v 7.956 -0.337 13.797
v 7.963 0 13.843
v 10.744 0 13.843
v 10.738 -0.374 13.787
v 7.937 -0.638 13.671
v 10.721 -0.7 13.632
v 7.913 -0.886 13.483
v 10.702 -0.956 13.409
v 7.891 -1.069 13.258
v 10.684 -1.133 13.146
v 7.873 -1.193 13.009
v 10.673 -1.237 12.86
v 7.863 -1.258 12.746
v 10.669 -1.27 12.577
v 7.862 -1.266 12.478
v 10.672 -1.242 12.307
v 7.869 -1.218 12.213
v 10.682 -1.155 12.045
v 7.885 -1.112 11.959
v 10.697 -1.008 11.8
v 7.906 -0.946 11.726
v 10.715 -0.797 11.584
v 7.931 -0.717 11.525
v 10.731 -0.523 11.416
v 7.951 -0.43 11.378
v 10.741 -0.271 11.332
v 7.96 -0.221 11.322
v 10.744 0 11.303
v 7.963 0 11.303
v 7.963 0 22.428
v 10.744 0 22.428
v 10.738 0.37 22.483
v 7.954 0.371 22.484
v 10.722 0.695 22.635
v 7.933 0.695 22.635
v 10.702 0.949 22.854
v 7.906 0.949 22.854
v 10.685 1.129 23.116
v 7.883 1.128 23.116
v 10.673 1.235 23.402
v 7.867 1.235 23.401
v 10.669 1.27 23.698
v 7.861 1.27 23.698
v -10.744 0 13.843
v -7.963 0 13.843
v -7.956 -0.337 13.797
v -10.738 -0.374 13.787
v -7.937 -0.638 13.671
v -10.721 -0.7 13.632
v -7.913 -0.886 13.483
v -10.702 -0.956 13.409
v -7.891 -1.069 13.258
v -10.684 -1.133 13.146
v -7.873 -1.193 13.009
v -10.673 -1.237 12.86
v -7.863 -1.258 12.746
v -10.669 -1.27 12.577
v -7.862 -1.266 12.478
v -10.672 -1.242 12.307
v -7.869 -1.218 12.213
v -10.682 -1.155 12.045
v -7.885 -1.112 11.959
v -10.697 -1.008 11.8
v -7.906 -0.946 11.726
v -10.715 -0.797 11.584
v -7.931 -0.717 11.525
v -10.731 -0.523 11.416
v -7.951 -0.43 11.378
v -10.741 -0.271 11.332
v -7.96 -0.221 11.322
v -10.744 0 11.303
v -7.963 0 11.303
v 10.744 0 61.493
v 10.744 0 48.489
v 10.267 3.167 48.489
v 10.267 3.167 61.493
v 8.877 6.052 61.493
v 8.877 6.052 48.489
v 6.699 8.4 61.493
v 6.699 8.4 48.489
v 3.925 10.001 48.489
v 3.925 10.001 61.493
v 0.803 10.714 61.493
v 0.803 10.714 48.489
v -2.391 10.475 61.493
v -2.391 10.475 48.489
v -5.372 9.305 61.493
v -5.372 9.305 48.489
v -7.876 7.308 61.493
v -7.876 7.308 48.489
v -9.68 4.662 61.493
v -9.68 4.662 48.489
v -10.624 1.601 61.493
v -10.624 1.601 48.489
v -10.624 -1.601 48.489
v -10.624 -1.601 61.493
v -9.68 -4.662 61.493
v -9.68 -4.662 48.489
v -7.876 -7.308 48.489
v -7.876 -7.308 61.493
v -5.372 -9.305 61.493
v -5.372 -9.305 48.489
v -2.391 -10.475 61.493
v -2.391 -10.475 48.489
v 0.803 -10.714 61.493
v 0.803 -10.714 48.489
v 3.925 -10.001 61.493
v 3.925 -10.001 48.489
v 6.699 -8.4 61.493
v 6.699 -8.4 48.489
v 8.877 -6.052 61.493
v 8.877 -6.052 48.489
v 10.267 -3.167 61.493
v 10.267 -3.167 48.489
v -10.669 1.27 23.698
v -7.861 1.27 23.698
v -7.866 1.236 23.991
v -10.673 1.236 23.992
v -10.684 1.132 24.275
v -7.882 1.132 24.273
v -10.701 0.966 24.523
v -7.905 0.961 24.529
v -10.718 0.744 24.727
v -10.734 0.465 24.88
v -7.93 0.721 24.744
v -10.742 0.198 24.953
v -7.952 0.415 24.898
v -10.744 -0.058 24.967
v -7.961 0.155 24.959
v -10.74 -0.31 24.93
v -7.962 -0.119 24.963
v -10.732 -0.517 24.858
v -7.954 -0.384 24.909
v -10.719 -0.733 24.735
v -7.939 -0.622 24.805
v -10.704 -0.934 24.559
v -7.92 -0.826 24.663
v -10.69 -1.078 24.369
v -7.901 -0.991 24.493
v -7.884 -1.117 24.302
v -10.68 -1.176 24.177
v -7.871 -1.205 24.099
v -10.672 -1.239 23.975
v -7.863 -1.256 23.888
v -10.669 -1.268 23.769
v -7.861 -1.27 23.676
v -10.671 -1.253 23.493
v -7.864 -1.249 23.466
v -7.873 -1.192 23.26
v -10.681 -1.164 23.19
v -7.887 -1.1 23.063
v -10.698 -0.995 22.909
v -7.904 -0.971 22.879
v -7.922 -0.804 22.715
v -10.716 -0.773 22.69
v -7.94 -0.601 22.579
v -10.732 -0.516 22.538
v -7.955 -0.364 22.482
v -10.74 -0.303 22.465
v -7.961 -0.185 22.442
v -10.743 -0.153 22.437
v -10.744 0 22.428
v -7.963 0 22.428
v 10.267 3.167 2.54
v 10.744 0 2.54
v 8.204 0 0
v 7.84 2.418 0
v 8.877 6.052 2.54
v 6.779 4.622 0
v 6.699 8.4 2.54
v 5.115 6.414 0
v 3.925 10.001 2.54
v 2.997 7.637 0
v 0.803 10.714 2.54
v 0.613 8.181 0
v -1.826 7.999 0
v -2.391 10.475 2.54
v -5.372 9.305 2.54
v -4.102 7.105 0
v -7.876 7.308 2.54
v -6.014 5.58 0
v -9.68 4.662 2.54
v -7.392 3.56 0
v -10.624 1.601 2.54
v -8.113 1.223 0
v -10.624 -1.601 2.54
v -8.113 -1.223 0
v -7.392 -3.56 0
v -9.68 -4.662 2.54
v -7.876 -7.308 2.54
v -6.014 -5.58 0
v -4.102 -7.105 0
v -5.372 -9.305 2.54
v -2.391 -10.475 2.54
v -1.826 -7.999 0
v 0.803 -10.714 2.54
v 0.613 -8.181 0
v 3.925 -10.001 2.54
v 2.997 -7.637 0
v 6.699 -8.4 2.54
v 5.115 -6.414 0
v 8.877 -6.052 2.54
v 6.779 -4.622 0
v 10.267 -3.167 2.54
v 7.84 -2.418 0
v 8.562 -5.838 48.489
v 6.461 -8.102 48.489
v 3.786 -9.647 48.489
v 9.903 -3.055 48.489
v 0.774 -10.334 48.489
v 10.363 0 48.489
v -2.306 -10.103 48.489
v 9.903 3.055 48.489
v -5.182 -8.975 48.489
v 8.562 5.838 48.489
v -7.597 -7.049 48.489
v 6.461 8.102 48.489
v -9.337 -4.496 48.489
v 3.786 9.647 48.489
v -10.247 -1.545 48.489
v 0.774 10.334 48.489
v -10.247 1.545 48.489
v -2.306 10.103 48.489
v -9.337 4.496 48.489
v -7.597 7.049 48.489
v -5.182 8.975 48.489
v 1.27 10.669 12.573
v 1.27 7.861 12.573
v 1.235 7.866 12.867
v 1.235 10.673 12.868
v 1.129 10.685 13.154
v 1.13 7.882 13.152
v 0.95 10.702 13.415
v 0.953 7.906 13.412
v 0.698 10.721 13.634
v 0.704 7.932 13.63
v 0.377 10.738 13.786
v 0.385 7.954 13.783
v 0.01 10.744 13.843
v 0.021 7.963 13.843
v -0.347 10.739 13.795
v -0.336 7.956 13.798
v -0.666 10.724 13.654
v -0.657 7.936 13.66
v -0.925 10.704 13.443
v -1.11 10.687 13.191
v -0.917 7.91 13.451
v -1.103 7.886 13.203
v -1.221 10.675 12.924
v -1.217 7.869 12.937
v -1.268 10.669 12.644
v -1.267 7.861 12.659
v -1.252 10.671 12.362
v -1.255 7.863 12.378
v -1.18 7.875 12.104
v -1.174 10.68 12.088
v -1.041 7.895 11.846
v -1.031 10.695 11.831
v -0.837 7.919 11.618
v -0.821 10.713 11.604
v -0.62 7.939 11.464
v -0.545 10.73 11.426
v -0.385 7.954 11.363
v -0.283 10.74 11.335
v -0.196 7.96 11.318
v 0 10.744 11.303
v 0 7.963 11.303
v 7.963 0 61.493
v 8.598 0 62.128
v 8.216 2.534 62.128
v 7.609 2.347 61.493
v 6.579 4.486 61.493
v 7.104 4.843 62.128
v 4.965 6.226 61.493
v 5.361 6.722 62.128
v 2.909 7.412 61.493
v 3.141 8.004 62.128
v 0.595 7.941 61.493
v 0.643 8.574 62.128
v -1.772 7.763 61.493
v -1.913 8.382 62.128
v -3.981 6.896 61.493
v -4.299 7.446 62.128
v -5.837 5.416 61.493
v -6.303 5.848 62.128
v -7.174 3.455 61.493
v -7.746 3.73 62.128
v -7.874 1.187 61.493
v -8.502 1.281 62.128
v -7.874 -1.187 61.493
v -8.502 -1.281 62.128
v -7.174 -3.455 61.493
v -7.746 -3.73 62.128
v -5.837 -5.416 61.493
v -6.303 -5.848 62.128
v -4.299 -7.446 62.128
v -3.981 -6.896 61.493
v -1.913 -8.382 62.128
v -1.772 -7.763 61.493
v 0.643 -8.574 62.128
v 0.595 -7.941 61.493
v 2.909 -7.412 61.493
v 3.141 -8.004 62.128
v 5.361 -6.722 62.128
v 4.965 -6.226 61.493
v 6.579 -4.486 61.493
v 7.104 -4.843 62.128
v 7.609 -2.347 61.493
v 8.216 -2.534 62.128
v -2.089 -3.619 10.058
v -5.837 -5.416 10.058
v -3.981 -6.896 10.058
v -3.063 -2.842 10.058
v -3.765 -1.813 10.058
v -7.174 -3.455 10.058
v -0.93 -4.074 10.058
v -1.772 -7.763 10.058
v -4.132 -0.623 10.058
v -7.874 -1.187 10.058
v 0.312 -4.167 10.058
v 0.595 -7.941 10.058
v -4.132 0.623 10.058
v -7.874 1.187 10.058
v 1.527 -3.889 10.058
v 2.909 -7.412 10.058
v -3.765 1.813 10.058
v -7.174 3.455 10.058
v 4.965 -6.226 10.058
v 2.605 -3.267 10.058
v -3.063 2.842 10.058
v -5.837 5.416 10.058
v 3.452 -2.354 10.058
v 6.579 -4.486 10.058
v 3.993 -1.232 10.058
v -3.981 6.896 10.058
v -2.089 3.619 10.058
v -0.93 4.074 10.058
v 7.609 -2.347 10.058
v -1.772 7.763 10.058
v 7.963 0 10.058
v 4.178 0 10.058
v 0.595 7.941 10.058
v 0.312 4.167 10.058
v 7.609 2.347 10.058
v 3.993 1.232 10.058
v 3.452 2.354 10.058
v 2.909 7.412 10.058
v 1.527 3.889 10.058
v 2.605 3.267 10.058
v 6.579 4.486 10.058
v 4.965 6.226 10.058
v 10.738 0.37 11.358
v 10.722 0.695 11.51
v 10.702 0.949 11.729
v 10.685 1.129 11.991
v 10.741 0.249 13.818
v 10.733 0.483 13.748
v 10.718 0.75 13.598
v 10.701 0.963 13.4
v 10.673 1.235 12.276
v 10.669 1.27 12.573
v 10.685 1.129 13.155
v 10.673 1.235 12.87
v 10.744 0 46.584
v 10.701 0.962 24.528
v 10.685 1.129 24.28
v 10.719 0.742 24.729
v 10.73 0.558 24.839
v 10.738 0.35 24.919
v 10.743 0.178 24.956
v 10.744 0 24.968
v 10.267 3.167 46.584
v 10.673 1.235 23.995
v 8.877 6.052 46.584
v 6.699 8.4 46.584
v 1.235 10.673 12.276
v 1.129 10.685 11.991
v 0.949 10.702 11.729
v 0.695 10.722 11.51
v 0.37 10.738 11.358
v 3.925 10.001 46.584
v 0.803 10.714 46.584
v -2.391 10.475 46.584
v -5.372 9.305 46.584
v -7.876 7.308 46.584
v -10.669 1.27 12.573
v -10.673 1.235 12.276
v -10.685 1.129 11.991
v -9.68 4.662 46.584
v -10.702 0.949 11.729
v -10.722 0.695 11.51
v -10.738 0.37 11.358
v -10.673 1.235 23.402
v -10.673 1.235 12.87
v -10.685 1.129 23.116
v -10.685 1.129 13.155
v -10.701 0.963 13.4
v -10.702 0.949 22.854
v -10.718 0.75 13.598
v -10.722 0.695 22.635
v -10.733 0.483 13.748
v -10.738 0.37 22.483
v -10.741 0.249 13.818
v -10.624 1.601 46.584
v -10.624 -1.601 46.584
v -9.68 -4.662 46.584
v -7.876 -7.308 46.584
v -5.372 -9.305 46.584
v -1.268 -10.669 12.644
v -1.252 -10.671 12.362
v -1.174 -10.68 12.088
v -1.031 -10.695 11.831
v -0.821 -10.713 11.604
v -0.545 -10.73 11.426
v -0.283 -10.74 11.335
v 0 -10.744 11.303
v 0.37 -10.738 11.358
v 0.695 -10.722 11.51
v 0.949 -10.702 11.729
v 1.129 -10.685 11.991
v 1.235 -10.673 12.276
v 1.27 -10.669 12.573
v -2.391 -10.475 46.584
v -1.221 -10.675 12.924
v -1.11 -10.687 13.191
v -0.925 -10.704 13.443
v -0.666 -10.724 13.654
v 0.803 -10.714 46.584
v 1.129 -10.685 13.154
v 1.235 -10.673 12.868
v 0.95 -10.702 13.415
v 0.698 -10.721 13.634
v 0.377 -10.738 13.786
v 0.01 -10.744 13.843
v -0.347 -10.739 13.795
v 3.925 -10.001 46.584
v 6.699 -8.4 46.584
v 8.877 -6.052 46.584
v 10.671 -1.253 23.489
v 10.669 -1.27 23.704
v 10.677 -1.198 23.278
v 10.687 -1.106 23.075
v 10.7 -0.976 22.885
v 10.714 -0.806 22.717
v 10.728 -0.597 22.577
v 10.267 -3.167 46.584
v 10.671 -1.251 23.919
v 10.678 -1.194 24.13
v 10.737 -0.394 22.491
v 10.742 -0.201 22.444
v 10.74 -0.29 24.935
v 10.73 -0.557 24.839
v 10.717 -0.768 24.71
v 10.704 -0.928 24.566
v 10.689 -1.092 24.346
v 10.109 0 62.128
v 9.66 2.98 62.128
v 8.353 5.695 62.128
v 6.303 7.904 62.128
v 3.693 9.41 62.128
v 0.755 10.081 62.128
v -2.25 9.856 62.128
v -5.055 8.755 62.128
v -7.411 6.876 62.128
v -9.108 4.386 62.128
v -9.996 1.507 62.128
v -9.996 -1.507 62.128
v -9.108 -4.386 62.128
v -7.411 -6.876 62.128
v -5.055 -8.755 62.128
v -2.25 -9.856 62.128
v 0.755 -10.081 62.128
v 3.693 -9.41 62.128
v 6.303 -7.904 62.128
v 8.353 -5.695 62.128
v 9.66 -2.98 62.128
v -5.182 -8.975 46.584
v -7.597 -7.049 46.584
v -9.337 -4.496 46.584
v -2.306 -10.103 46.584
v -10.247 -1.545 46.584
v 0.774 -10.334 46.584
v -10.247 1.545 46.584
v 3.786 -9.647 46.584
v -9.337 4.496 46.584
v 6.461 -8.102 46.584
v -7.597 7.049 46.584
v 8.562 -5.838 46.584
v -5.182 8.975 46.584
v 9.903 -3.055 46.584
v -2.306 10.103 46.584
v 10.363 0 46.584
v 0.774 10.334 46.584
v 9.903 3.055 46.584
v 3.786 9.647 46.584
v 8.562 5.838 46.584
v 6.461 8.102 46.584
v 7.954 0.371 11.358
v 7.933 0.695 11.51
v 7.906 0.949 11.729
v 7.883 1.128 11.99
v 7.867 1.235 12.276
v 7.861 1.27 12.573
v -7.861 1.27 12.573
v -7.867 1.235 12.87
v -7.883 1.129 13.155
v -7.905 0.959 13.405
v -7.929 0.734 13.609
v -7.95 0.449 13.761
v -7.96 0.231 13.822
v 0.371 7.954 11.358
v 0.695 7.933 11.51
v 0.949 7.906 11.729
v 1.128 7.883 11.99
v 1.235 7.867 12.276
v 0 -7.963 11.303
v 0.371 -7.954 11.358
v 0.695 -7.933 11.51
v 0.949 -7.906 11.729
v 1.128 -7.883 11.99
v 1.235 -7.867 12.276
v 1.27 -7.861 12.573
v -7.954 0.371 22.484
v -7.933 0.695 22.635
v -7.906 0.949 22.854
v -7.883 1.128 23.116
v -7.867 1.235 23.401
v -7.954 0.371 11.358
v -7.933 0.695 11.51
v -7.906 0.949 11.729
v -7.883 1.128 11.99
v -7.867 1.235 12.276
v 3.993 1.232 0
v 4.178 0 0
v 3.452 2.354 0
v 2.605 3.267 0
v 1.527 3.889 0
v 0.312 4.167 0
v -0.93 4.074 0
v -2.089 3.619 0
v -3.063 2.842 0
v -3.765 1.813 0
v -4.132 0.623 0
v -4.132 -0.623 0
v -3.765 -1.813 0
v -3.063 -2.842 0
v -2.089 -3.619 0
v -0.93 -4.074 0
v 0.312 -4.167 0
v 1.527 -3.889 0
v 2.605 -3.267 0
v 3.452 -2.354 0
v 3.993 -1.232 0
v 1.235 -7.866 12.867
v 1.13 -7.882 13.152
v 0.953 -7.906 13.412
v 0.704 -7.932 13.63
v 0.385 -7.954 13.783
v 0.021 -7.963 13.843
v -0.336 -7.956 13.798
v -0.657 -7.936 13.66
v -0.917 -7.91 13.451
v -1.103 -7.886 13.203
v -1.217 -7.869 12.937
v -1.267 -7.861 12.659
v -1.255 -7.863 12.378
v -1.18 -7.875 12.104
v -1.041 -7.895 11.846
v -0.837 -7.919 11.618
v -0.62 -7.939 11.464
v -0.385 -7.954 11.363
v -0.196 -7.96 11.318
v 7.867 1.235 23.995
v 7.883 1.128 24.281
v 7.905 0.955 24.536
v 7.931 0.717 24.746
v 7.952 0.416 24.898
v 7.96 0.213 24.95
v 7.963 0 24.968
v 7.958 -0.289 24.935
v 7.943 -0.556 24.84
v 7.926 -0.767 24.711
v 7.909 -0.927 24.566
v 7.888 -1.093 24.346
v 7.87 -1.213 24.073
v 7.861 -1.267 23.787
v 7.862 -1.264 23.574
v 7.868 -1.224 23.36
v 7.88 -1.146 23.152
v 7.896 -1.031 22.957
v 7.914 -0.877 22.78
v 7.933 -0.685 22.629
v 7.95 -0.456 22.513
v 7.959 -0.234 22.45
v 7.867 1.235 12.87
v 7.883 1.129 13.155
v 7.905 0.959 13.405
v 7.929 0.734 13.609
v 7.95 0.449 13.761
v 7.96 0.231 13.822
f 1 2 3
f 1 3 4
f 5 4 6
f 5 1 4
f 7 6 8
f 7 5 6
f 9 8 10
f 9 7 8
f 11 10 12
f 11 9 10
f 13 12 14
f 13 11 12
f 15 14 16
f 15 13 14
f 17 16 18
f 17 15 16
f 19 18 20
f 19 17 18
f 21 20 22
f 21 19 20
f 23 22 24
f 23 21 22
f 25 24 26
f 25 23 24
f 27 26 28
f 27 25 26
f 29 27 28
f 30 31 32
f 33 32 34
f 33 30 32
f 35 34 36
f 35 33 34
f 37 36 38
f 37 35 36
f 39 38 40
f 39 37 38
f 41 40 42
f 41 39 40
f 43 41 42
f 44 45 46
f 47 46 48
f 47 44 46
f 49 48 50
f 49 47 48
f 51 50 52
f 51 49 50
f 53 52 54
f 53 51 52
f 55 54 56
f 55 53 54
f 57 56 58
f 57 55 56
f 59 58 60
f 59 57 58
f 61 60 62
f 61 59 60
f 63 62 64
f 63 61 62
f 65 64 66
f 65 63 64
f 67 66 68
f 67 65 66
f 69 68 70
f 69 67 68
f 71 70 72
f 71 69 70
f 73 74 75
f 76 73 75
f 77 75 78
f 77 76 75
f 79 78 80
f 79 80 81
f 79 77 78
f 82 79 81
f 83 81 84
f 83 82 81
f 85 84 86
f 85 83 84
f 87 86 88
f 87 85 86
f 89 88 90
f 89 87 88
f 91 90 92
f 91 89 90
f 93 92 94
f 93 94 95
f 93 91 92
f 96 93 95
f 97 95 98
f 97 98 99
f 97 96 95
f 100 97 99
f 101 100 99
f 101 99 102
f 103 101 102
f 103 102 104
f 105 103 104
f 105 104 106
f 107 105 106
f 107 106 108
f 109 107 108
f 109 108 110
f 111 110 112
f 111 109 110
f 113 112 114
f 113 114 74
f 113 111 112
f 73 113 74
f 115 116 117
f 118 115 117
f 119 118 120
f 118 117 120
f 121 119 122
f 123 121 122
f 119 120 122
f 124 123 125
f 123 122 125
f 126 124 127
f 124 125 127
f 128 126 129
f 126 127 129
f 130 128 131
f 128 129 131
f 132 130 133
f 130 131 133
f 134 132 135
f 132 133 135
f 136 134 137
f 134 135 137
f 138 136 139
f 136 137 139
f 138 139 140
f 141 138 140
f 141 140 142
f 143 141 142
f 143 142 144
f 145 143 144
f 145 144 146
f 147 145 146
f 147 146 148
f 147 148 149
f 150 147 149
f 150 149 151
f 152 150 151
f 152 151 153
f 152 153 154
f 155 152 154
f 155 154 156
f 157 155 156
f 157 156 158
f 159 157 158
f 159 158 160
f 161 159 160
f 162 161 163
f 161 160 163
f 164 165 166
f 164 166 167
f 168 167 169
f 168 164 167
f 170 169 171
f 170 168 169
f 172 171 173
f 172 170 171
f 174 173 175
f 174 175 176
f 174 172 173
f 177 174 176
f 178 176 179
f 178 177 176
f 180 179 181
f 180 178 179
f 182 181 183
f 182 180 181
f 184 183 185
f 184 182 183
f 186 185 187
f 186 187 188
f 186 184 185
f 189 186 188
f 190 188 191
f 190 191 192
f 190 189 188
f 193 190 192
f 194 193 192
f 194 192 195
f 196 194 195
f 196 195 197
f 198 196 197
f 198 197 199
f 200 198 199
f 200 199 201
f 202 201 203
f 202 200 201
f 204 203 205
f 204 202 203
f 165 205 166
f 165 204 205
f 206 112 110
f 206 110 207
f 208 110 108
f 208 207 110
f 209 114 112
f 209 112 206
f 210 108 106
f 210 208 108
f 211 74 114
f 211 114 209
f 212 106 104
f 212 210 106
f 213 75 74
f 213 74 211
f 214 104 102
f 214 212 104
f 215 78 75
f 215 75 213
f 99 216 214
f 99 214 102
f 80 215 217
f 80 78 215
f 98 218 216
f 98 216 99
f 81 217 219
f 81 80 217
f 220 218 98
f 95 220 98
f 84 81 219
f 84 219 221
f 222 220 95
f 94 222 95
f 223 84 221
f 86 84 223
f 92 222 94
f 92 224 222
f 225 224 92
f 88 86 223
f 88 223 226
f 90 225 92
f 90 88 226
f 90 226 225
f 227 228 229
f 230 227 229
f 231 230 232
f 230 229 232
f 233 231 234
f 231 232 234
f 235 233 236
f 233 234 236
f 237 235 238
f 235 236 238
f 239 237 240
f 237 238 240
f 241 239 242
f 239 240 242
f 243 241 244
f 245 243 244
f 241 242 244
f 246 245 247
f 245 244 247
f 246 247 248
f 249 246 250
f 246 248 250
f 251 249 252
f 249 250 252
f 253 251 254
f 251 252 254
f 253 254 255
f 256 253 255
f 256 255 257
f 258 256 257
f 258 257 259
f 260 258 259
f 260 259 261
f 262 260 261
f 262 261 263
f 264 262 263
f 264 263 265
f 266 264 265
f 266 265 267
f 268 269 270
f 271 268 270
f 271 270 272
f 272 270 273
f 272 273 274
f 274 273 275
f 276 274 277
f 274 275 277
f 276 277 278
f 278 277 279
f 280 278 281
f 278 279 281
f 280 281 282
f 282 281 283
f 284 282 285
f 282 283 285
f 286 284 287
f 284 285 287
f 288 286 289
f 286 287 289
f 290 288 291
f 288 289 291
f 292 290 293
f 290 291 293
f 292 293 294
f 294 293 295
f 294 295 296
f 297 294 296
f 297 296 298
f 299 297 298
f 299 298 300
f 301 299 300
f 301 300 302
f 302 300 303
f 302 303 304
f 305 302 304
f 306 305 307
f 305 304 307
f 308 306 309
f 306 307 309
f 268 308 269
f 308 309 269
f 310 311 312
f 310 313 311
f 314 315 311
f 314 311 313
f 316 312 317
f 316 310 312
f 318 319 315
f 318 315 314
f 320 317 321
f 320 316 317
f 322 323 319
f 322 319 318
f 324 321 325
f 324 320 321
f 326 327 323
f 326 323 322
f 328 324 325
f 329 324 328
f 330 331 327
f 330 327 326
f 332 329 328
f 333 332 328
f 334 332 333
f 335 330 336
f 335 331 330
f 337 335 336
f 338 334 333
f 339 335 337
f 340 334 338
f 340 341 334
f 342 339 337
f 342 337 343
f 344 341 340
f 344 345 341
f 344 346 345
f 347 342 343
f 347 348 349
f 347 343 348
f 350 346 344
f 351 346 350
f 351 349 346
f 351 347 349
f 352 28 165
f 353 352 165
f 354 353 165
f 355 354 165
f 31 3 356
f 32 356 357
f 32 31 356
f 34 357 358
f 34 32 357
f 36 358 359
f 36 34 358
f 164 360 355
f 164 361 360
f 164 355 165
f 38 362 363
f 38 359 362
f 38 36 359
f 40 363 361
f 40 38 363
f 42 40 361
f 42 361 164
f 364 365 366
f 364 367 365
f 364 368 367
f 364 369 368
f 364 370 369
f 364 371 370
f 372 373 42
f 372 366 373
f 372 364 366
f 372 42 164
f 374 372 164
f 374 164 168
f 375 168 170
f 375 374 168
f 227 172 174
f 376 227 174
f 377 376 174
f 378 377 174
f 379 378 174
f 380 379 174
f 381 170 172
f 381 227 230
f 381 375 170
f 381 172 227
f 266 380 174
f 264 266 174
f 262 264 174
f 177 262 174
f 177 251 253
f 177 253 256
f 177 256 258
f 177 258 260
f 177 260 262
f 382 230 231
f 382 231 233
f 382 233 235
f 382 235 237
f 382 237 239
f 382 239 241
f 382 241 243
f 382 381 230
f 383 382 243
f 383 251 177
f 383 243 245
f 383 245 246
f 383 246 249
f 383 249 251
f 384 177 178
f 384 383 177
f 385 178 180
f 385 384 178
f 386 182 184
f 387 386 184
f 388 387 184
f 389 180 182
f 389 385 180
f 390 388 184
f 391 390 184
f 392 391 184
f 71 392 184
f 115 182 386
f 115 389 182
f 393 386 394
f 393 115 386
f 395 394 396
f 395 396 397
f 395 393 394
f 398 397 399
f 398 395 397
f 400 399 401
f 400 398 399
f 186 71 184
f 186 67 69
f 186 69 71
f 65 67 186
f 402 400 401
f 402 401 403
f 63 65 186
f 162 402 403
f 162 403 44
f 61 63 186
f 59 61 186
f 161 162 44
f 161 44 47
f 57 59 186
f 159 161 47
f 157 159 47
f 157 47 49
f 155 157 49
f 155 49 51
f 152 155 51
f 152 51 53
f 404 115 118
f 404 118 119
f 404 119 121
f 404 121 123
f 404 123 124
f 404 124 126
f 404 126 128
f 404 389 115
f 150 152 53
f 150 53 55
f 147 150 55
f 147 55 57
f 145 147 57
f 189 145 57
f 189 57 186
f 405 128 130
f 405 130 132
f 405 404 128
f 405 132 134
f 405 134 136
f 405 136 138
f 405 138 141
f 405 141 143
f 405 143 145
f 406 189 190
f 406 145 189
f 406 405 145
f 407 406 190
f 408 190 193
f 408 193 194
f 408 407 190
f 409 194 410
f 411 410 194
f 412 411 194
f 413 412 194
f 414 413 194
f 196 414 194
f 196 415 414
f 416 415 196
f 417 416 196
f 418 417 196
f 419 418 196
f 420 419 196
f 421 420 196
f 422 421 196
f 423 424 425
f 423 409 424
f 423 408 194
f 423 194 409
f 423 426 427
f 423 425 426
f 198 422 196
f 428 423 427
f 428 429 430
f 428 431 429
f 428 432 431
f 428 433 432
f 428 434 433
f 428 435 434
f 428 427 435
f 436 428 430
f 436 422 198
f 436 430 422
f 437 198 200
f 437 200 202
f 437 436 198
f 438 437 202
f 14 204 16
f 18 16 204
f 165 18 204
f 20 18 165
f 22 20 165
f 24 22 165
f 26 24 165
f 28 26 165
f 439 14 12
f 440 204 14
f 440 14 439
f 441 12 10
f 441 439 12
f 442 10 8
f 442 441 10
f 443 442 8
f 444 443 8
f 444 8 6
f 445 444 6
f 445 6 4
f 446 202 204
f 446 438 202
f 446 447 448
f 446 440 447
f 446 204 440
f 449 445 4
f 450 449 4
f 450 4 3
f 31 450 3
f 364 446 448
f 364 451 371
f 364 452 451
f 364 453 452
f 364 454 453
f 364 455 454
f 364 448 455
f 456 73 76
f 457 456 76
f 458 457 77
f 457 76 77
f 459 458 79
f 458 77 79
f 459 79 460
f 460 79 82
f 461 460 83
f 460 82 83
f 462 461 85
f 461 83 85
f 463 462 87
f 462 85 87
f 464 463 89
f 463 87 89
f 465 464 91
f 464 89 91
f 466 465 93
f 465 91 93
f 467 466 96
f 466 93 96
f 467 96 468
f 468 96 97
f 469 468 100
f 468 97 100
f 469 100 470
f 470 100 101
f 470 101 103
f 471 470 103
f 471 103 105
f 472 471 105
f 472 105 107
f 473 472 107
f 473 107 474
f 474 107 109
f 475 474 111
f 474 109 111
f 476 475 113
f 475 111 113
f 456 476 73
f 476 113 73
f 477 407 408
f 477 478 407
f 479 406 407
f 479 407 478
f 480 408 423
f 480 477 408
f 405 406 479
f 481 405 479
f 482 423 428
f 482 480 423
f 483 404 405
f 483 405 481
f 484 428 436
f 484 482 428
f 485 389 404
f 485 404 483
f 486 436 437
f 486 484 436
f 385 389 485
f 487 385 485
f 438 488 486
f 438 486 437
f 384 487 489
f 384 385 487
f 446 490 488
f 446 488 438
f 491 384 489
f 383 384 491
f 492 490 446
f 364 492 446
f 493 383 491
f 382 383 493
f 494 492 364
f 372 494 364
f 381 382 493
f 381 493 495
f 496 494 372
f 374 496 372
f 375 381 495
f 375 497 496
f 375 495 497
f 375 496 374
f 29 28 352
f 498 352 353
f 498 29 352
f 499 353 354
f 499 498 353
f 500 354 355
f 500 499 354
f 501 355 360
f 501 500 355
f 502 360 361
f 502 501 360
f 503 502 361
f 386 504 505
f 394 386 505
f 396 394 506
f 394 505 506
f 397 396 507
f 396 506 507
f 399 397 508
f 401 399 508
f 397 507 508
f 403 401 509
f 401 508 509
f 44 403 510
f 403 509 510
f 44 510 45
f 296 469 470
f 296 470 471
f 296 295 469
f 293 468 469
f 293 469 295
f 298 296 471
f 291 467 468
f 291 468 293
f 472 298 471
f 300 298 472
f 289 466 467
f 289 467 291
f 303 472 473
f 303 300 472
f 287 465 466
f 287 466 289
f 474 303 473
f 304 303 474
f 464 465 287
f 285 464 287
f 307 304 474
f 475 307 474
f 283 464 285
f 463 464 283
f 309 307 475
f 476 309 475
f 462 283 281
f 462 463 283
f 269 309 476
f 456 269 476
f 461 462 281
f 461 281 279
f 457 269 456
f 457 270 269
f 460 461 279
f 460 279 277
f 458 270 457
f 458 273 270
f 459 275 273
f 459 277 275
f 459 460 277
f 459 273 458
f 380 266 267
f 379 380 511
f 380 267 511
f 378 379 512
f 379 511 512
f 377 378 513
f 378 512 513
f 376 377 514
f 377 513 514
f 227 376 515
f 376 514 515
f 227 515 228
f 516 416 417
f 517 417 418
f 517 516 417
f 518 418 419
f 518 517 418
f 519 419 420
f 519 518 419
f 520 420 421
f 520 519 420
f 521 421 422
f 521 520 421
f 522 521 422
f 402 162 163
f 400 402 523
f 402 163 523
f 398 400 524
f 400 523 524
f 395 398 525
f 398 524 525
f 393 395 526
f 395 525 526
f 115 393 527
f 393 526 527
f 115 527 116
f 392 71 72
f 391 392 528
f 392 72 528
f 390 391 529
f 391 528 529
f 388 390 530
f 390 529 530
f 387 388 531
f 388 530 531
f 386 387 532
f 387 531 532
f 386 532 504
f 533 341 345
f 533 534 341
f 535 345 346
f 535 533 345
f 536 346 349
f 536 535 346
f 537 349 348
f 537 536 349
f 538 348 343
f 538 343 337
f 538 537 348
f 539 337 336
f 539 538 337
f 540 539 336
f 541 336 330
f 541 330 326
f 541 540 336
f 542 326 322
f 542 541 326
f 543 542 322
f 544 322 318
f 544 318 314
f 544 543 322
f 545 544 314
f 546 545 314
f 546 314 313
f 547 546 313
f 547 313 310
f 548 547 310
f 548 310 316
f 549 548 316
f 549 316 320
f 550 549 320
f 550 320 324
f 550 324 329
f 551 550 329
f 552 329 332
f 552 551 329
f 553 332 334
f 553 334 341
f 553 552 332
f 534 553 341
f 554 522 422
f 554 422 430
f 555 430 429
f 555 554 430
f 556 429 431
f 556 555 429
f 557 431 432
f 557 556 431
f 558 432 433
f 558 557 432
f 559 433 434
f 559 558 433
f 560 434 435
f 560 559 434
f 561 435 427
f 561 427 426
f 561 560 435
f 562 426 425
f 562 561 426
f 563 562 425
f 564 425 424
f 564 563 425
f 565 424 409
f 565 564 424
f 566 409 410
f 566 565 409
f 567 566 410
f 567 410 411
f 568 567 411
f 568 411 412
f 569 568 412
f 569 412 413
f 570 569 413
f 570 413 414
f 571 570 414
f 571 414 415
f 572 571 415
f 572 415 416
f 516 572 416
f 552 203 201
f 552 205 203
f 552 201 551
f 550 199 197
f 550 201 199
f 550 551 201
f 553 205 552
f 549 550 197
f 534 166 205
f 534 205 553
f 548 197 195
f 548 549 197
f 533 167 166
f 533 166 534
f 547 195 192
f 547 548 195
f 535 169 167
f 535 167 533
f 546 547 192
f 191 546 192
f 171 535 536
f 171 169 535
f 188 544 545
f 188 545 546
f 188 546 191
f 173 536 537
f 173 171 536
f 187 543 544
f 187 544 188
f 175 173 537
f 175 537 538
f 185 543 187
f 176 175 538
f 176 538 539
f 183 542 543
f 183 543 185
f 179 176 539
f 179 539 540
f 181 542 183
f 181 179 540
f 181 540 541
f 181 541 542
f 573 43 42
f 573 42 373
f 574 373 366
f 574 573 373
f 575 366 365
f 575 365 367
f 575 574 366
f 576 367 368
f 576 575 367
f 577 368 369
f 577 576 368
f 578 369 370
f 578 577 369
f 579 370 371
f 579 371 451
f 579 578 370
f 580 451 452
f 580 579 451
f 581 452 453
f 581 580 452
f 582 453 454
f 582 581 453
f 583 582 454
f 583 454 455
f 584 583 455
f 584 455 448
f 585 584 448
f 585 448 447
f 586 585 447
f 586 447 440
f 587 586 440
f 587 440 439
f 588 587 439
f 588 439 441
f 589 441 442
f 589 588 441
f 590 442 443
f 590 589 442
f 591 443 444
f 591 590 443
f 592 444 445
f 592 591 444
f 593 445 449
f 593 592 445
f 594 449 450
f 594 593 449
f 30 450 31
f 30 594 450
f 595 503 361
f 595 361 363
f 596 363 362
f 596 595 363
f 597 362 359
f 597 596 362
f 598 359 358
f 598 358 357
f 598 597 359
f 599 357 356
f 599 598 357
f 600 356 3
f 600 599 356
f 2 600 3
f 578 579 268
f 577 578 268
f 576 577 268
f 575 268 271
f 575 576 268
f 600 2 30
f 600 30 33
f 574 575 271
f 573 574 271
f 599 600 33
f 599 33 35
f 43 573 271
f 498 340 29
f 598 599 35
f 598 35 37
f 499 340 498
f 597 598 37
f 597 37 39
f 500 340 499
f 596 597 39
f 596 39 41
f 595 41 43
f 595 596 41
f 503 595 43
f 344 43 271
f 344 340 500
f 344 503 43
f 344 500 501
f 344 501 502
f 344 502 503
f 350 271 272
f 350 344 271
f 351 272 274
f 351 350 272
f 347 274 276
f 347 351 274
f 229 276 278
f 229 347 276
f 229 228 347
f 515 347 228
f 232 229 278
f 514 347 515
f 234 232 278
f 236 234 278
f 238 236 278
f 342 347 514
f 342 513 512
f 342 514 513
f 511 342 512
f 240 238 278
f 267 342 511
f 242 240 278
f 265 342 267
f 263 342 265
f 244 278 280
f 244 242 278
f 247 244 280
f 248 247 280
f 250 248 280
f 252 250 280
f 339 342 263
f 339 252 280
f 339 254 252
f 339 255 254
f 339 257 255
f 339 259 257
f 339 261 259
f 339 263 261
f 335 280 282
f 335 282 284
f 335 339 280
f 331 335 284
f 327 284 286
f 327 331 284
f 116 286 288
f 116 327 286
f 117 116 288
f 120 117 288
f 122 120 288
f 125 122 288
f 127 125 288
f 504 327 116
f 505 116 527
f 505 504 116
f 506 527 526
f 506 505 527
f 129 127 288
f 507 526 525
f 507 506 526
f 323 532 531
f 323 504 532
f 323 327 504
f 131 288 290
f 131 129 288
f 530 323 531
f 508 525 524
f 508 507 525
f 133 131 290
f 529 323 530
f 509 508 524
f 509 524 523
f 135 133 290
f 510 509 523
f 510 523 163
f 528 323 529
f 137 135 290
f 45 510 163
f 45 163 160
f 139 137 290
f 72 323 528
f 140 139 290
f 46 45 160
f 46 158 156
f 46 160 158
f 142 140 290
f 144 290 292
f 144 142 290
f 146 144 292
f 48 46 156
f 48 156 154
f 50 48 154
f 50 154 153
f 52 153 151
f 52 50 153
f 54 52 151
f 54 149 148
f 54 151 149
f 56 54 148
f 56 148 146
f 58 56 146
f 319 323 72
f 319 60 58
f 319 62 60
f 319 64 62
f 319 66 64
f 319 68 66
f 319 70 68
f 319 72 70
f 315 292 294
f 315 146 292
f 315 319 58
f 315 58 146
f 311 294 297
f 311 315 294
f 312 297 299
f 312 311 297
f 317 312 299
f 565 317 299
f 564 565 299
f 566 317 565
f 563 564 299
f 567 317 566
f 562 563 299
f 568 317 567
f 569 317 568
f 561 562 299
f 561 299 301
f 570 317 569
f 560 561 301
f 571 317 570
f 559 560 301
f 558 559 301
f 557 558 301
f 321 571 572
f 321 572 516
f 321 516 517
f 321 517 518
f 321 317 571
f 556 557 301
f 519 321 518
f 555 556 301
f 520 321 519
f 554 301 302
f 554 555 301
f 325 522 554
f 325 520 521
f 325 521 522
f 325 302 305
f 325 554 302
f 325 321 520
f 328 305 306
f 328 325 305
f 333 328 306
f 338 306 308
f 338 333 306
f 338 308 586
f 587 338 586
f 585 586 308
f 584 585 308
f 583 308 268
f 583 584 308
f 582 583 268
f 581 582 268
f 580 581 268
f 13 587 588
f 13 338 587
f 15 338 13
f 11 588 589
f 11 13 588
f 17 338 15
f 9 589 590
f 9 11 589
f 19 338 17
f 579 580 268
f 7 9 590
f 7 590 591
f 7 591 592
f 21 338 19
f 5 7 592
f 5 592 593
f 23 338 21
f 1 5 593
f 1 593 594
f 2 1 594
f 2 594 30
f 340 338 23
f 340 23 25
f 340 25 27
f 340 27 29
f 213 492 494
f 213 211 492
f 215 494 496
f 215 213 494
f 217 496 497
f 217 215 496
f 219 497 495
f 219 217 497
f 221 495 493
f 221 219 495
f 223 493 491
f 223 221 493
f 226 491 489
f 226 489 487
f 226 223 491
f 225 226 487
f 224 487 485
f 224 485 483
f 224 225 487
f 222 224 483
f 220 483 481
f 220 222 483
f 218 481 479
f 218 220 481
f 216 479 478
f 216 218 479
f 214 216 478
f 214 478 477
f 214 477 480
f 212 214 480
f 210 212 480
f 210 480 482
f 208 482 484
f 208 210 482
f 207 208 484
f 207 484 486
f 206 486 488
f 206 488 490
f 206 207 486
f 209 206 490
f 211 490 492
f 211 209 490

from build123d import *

# Parameters (mm, degrees)
F2_SIZE  = 2.54
F3_SIZE  = 0.635
F5_DEPTH = 12.7
F7_DEPTH = 12.7


with BuildPart() as f1:
    # F0 (on Front) → F1 (revolve)
    with BuildSketch(Plane.XZ):
        Polygon((4.1783, 10.0584), (4.1783, 0), (10.7442, 0), (10.7442, 46.5836), (10.3632, 46.5836), (10.3632, 48.4886), (10.7442, 48.4886), (10.7442, 62.1284), (7.9629, 62.1284), (7.9629, 10.0584), align=None)
    revolve(axis=Axis((0, 0, 31.0642), (0, 0, 1)))

    # F2
    f2_edges = [f1.edges().sort_by_distance(p)[0] for p in [
        (-10.7442, 0, 0),
    ]]
    chamfer(f2_edges, length=F2_SIZE)

    # F3
    f3_edges = [f1.edges().sort_by_distance(p)[0] for p in [
        (-10.7442, 0, 62.1284),
        (-7.9629, 0, 62.1284),
    ]]
    chamfer(f3_edges, length=F3_SIZE)

    # F4 (on Right) → F5 (cut, symmetric)
    with BuildSketch(Plane.YZ):
        with BuildLine():
            ThreePointArc((0, 13.843), (-1.27, 12.573), (0, 11.303))
            Line((0, 11.303), (0, 12.573))
            Line((0, 12.573), (0, 13.843))
        make_face()
        with BuildLine():
            ThreePointArc((1.27, 23.6982), (-0.8980256121, 24.5962256121), (0, 22.4282))
            ThreePointArc((0, 22.4282), (0.8980256121, 22.8001743879), (1.27, 23.6982))
        make_face()
        with BuildLine():
            Line((0, 12.573), (0, 11.303))
            ThreePointArc((0, 11.303), (0.8980256121, 11.6749743879), (1.27, 12.573))
            ThreePointArc((1.27, 12.573), (0.8980256121, 13.4710256121), (0, 13.843))
            Line((0, 13.843), (0, 12.573))
        make_face()
    extrude(amount=F5_DEPTH, both=True, mode=Mode.SUBTRACT)

    # F6 (on Front) → F7 (cut, symmetric)
    with BuildSketch(Plane.XZ):
        with BuildLine():
            ThreePointArc((0, 11.303), (0.8980256121, 11.6749743879), (1.27, 12.573))
            ThreePointArc((1.27, 12.573), (-0.8980256121, 13.4710256121), (0, 11.303))
        make_face()
    extrude(amount=F7_DEPTH, both=True, mode=Mode.SUBTRACT)


solid = f1.part
